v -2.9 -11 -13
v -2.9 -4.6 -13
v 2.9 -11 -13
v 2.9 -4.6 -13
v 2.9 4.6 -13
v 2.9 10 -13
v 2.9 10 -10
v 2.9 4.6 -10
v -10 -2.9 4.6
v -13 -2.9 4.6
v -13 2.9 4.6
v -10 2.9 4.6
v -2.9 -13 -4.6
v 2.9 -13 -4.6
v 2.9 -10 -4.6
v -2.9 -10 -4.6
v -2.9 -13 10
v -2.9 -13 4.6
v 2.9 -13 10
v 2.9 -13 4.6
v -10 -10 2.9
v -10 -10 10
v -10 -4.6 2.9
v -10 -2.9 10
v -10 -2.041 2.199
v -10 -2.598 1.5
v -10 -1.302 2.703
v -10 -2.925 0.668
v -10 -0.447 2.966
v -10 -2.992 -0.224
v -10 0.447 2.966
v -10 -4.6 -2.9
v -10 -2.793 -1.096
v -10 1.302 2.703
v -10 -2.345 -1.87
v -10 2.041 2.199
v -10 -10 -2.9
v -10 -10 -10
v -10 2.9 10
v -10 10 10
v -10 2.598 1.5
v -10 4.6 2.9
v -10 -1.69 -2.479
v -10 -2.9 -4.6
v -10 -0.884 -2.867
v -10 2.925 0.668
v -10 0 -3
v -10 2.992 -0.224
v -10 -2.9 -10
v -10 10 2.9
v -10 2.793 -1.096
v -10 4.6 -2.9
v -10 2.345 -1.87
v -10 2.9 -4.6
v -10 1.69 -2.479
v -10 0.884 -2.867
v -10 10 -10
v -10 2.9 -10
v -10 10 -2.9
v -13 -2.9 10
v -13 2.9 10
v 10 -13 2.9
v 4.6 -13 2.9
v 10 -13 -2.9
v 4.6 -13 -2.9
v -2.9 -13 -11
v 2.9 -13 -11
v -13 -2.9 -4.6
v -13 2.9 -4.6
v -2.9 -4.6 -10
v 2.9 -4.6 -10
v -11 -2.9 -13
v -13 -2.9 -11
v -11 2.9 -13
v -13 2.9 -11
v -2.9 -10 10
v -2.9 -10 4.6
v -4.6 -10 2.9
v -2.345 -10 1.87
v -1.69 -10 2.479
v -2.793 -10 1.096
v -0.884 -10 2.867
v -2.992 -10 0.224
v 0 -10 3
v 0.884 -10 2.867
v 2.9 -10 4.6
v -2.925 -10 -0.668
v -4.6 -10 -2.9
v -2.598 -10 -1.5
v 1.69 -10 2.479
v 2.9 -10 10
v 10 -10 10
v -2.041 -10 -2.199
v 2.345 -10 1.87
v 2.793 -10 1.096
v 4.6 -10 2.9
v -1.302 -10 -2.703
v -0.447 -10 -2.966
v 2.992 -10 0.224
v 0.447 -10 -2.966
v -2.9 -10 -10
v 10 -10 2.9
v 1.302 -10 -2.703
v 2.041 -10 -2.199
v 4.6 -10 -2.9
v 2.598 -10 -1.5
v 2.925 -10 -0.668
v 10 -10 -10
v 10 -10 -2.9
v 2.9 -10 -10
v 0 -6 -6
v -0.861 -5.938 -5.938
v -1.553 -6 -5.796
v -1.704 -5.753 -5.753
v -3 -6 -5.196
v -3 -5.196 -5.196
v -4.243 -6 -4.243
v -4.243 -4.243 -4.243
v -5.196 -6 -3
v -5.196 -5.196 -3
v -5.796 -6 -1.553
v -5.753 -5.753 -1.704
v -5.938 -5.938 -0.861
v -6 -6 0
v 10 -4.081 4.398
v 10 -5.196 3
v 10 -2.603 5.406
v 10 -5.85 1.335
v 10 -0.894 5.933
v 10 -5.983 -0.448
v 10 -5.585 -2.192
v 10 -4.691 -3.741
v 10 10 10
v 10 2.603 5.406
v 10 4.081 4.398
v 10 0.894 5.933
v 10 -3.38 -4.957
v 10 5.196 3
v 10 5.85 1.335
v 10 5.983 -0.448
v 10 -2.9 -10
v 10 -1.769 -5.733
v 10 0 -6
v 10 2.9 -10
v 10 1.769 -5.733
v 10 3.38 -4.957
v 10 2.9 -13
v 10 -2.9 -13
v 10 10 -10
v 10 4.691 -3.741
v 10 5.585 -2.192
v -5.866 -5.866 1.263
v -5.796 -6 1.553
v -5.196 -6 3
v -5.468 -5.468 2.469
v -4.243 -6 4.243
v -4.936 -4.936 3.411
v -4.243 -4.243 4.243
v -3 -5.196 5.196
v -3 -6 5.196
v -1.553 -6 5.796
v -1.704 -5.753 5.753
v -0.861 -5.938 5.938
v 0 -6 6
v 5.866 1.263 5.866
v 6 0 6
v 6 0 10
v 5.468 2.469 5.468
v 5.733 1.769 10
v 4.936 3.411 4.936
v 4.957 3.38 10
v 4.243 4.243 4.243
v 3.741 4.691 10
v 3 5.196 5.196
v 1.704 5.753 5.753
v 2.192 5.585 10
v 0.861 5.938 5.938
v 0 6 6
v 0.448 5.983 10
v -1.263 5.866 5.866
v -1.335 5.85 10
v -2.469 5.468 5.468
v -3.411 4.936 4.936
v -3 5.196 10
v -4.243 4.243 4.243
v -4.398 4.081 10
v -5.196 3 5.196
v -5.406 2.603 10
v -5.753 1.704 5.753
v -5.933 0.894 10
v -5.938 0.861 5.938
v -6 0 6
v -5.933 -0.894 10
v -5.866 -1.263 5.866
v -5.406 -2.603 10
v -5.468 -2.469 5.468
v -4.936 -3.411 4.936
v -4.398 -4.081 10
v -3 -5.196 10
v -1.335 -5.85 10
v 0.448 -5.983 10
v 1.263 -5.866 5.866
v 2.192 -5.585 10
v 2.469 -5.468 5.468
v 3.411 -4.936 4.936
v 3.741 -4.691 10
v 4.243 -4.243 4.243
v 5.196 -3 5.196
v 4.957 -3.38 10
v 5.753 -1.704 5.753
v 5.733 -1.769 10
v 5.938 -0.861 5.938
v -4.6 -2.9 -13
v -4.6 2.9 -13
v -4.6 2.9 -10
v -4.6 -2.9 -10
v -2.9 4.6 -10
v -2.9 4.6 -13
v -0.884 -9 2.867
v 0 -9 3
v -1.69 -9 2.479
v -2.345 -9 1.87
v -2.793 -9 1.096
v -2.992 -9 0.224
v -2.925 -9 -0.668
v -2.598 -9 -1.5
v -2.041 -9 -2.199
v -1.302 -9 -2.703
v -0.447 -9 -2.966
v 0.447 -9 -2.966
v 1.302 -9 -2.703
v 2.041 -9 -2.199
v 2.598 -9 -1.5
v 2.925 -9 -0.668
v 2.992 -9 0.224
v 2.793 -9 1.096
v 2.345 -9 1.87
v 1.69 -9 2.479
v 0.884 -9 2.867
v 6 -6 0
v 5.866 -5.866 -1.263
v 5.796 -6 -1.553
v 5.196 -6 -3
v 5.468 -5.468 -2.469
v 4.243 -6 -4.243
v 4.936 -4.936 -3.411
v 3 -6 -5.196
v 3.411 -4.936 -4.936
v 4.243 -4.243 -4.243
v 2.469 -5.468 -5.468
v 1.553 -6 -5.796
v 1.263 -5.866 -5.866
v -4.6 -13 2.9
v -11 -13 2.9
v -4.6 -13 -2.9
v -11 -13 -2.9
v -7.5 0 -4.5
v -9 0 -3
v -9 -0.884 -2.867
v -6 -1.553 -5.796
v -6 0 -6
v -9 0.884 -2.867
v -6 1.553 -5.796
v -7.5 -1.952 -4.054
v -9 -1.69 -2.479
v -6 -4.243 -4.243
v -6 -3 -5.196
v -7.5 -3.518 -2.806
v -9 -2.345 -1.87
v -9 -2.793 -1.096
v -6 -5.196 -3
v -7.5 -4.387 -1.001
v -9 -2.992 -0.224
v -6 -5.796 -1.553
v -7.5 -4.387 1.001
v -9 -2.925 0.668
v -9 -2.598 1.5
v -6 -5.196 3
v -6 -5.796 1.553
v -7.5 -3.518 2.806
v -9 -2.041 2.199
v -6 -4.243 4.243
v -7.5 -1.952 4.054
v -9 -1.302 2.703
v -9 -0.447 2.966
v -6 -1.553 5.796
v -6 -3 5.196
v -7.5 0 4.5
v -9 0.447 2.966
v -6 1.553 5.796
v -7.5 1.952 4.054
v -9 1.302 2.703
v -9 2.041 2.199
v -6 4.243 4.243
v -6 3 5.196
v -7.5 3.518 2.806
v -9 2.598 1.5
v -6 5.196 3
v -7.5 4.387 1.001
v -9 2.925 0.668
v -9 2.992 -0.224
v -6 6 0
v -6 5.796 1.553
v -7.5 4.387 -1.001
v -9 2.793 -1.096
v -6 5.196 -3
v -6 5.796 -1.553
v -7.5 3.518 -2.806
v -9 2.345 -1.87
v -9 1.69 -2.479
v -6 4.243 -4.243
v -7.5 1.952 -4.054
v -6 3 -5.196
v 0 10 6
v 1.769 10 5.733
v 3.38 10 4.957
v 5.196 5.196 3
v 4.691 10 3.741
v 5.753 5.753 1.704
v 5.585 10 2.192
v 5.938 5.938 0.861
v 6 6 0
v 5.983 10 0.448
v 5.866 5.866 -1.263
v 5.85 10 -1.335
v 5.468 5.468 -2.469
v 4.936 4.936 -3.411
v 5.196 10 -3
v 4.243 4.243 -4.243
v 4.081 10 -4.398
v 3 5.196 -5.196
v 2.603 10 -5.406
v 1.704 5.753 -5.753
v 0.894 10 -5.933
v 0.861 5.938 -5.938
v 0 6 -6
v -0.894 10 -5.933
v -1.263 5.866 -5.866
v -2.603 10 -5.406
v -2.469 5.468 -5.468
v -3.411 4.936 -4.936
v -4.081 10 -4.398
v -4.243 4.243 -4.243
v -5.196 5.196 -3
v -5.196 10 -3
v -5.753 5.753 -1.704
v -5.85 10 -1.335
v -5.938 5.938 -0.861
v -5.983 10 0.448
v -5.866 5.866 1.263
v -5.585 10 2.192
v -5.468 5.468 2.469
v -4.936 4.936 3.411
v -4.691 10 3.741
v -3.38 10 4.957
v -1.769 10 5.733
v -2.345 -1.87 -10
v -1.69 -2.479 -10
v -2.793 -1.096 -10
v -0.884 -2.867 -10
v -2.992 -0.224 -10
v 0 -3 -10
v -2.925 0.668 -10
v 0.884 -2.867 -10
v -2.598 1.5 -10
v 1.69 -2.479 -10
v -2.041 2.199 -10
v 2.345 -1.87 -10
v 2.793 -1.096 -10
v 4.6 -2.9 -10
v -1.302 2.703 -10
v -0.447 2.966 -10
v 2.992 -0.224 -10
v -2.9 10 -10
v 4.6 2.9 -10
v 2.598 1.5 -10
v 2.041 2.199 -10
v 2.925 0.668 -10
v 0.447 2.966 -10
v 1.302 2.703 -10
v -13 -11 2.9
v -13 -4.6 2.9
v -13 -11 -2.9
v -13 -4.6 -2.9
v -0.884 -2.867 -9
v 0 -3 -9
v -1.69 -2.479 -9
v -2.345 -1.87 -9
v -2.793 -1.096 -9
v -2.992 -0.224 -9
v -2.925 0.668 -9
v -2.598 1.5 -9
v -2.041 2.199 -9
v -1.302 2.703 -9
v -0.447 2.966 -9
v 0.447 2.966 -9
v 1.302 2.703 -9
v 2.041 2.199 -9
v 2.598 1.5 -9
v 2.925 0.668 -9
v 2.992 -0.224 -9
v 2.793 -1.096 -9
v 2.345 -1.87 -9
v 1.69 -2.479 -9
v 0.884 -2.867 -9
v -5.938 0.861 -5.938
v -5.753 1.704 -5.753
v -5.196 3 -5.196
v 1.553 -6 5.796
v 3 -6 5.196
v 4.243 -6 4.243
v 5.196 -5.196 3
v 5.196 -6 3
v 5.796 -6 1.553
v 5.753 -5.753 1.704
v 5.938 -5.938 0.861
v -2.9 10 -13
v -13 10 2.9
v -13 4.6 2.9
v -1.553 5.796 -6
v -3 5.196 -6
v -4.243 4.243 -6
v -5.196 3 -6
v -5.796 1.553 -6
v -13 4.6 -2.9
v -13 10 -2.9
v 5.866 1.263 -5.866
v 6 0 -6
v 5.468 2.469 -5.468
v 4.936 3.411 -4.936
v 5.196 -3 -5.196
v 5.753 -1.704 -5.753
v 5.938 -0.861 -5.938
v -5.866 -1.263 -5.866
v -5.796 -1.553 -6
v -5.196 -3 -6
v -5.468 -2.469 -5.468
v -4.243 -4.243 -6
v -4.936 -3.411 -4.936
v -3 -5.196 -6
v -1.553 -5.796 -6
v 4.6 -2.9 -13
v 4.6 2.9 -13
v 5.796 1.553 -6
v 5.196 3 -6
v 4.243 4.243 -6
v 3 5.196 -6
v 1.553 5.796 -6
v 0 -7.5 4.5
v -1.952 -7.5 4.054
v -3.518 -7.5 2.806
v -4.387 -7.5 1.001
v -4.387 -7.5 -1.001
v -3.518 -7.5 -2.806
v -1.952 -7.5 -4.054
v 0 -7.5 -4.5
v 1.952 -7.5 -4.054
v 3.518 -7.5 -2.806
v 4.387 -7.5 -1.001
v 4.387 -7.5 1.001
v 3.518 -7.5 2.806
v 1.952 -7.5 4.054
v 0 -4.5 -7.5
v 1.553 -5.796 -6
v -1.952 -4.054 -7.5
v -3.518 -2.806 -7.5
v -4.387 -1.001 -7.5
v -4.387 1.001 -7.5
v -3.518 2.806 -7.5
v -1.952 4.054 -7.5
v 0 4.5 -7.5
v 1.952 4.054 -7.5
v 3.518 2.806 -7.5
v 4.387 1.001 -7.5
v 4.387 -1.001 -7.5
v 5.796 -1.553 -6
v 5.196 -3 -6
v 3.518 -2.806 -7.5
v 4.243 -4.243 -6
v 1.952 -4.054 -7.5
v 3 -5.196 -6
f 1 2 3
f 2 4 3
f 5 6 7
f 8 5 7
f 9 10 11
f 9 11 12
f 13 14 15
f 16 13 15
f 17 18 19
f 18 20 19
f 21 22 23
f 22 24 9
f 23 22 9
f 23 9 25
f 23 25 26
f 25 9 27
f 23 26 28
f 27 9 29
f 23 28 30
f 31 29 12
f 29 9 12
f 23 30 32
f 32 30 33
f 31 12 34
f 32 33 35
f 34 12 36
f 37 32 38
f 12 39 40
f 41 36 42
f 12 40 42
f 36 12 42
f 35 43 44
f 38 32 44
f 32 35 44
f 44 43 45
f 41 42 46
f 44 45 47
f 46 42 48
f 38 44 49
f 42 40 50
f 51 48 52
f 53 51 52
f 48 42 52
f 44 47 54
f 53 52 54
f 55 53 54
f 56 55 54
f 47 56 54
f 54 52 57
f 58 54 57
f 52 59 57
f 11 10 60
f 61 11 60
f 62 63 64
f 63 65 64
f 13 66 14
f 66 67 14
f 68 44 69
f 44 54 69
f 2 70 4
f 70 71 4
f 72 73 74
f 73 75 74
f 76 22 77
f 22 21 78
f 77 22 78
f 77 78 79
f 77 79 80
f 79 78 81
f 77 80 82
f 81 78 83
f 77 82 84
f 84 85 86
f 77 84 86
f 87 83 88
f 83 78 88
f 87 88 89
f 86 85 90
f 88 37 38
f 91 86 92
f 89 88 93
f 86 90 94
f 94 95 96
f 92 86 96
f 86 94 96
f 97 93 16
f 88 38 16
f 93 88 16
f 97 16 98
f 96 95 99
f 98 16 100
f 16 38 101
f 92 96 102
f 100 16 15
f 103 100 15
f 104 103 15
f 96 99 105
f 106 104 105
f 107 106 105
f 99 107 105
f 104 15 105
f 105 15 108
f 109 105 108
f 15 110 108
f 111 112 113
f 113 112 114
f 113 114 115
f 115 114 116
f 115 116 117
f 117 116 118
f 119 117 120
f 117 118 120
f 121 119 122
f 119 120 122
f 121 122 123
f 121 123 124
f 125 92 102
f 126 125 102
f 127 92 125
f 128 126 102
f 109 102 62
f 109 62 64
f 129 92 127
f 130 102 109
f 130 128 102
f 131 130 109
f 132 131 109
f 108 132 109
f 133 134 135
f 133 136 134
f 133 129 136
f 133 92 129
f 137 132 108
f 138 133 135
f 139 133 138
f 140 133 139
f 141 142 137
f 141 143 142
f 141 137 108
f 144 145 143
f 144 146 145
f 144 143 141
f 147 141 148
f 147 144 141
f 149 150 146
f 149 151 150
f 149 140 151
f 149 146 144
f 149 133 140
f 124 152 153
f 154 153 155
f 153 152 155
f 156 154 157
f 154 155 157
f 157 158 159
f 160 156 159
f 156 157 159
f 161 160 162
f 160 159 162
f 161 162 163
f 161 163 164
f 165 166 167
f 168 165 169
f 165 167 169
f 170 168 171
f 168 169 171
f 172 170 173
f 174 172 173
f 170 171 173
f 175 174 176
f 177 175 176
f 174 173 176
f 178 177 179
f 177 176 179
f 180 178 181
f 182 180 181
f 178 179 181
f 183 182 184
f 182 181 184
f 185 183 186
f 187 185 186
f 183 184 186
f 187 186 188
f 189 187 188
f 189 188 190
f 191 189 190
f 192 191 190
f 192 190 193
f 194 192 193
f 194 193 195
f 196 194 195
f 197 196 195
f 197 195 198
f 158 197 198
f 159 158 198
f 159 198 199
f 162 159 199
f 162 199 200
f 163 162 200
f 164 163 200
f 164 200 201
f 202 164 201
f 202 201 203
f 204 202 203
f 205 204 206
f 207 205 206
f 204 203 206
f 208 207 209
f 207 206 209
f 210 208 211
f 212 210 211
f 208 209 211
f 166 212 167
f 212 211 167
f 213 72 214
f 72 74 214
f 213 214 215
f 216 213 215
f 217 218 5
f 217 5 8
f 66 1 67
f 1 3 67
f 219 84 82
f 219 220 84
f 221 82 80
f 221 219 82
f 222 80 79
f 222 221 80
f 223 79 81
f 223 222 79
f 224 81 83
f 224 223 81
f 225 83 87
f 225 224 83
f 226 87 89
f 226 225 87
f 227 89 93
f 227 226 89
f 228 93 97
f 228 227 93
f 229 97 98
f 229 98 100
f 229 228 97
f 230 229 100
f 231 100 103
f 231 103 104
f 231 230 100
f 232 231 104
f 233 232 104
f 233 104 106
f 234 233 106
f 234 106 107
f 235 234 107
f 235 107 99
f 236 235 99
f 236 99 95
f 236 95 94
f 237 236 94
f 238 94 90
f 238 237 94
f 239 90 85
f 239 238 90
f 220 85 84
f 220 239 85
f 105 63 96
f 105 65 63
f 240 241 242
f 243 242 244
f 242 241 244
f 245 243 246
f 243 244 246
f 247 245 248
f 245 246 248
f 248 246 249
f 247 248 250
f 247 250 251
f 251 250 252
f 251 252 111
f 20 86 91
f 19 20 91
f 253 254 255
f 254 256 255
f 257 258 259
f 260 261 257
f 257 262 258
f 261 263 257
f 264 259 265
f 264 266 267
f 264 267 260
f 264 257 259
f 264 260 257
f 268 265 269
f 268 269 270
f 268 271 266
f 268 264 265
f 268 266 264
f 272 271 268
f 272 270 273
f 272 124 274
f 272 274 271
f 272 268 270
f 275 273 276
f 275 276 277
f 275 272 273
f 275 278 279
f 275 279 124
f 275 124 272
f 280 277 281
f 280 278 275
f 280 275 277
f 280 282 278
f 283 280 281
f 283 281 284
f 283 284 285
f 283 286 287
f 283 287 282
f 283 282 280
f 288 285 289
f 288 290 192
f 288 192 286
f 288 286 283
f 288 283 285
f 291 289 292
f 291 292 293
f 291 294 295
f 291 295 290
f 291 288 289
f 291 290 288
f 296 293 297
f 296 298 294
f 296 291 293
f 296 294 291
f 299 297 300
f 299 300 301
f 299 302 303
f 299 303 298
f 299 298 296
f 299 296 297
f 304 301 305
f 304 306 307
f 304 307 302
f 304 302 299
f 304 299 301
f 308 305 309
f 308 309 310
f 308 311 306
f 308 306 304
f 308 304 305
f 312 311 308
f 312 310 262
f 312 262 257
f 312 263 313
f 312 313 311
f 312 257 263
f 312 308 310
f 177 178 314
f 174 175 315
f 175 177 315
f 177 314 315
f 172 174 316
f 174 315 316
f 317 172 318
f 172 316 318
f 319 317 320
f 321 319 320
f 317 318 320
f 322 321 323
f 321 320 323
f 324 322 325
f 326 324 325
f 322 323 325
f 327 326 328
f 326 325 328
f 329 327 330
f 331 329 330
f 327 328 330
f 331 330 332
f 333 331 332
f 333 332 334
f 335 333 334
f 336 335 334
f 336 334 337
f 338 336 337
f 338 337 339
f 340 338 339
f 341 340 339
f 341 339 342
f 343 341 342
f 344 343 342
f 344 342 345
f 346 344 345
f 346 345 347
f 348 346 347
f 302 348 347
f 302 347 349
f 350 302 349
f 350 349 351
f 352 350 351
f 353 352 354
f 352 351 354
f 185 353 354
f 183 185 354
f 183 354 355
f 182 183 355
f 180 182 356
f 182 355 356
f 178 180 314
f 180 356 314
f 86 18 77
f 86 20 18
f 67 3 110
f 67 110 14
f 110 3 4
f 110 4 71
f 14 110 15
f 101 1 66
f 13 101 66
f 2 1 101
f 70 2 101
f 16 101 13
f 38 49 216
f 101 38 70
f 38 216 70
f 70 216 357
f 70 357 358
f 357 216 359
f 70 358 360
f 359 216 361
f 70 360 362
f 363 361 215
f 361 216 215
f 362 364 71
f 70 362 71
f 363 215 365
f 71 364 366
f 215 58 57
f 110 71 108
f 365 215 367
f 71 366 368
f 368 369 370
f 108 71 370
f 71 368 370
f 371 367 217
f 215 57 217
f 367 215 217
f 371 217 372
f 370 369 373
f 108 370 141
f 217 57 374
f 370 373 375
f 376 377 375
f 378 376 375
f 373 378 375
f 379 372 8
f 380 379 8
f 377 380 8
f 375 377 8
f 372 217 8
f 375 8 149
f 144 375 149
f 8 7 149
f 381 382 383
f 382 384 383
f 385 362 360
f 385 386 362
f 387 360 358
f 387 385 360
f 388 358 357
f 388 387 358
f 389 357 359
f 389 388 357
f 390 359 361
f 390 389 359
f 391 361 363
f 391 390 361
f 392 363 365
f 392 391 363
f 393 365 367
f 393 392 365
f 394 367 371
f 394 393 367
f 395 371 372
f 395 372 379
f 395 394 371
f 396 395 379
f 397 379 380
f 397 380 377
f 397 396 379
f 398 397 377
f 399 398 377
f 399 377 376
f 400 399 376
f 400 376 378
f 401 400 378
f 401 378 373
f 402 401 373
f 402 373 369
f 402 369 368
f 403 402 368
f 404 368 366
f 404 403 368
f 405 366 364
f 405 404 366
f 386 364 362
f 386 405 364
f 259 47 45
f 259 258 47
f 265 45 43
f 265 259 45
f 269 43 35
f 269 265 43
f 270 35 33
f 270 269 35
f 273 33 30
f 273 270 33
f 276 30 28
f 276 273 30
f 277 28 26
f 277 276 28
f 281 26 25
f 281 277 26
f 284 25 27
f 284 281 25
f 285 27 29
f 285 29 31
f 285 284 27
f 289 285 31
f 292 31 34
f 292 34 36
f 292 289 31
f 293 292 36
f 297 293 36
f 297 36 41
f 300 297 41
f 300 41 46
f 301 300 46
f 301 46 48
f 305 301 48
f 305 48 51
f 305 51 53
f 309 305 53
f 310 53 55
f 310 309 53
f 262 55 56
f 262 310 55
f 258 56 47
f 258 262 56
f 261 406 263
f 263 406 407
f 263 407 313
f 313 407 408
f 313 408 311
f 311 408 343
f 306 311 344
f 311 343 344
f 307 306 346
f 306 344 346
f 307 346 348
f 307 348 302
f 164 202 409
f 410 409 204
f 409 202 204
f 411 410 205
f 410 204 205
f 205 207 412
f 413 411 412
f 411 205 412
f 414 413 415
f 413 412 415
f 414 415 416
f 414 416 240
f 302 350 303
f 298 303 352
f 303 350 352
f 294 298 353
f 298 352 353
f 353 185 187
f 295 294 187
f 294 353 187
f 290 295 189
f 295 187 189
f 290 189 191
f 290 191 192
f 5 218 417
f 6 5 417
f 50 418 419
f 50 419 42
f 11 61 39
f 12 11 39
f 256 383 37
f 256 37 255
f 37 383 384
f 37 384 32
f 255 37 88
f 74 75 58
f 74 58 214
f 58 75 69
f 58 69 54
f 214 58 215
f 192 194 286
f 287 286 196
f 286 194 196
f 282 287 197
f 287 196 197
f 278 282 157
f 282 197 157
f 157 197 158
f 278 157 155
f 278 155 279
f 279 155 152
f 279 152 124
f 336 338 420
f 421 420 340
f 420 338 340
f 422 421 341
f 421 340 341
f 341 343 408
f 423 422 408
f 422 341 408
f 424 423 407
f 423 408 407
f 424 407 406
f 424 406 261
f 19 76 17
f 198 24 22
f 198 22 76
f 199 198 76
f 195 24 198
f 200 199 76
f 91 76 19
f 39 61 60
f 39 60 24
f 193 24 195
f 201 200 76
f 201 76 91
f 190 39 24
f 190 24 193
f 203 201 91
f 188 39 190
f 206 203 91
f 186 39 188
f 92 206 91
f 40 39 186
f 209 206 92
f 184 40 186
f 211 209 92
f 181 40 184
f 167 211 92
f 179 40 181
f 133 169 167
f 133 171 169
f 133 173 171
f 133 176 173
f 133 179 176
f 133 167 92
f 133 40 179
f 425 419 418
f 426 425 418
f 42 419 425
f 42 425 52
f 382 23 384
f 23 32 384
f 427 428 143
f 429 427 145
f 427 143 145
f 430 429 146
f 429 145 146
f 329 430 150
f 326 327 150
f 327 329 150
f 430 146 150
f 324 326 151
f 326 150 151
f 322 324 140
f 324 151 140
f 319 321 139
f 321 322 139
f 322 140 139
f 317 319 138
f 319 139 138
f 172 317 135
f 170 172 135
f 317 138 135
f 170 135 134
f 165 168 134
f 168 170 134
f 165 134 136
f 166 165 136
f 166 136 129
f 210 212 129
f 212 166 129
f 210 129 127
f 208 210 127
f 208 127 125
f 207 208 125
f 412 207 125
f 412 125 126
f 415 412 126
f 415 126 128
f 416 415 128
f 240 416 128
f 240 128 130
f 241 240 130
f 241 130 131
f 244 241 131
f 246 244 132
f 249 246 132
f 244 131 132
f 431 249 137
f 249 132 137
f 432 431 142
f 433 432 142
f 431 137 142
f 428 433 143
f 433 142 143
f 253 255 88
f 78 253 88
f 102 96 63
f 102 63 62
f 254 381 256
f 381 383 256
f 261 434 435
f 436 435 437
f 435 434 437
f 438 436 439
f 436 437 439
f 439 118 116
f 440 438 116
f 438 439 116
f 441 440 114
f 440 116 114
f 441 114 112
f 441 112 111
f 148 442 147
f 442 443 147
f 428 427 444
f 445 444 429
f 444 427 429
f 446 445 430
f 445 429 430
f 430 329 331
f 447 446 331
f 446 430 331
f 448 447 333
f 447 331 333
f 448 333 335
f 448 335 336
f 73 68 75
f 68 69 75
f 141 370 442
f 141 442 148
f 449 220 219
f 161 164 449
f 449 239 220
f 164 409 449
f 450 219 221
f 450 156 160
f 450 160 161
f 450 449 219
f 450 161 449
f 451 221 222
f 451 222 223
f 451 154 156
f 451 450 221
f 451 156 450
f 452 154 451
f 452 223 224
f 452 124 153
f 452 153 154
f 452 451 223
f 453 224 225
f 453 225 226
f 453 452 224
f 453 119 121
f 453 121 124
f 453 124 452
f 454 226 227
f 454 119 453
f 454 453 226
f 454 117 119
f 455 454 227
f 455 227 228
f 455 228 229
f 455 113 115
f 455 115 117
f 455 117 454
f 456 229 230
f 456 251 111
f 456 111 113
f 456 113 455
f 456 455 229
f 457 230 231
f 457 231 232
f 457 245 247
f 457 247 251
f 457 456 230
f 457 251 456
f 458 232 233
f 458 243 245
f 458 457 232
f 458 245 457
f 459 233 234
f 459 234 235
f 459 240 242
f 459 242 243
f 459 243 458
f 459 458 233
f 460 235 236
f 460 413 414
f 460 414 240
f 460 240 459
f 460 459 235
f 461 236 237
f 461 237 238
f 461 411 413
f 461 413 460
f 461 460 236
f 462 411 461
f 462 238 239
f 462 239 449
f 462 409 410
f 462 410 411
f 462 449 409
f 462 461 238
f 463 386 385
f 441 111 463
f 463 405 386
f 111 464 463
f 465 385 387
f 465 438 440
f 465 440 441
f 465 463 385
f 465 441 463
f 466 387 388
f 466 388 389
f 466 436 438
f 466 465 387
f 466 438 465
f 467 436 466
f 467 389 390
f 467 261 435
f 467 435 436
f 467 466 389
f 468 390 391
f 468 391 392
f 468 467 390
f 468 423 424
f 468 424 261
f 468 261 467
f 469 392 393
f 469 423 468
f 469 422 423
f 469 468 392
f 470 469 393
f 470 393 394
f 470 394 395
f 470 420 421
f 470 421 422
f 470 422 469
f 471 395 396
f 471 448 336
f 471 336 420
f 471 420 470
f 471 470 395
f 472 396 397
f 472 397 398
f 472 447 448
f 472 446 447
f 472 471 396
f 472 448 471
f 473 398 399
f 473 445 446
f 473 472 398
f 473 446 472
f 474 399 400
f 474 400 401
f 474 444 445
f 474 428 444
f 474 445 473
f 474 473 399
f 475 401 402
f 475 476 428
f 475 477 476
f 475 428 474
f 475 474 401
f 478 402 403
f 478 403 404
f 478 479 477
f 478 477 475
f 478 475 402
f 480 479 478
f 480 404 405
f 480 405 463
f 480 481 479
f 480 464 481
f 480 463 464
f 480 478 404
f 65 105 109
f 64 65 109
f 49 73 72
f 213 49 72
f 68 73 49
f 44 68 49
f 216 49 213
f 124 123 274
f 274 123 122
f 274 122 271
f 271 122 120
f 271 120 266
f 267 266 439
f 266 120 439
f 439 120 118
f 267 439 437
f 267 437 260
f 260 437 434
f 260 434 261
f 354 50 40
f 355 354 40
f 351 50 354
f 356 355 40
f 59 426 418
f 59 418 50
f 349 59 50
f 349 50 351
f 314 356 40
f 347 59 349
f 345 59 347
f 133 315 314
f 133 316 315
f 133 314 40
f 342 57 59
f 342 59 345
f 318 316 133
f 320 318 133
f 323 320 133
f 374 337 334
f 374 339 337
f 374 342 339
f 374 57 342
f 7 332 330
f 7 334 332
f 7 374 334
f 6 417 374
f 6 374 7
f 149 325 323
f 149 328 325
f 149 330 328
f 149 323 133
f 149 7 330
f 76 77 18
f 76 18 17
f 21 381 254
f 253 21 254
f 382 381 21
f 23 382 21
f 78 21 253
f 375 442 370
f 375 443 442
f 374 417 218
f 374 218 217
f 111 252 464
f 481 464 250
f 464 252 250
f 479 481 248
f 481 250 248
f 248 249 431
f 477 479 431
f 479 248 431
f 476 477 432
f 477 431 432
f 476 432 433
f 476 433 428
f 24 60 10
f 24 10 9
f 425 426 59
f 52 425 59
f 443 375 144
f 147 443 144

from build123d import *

# Parameters (mm, degrees)
SKETCH1_W           = 20
SKETCH1_H           = 20
BOSS_EXTRUDE1_DEPTH = 10
SKETCH_Z_R          = 6
CUT_EXTRUDE1_DEPTH  = 16
SKETCH_Y_R          = 6
CUT_EXTRUDE2_DEPTH  = 16
SKETCH_X_R          = 6
CUT_EXTRUDE3_DEPTH  = 16
SKETCH32_W          = 5.4
SKETCH32_H          = 3
SKETCH32_W_2        = 3
SKETCH32_H_2        = 5.4
CON_DEPTH           = 2.9
CIRPATTERN5_COUNT   = 2
CIRPATTERN5_ANGLE   = 270
CIRPATTERN9_COUNT   = 2
CIRPATTERN9_ANGLE   = 90


with BuildPart() as part:
    # Sketch1 → Boss-Extrude1 (new, symmetric)
    with BuildSketch(Plane(origin=(0, 0, 0), x_dir=(1, 0, 0), z_dir=(0, 1, 0))):
        Rectangle(SKETCH1_W, SKETCH1_H)
    extrude(amount=BOSS_EXTRUDE1_DEPTH, both=True)

    # Sketch Z → Cut-Extrude1 (cut)
    with BuildSketch(Plane.XY.offset(10)):
        Circle(SKETCH_Z_R)
    extrude(amount=-CUT_EXTRUDE1_DEPTH, mode=Mode.SUBTRACT)

    # Sketch Y → Cut-Extrude2 (cut)
    with BuildSketch(Plane(origin=(0, 10, 0), x_dir=(1, 0, 0), z_dir=(0, 1, 0))):
        with Locations(Location((0, 0, 0), (0, 0, 270))):
            Circle(SKETCH_Y_R)
    extrude(amount=-CUT_EXTRUDE2_DEPTH, mode=Mode.SUBTRACT)

    # Sketch X → Cut-Extrude3 (cut)
    with BuildSketch(Plane(origin=(10, 0, 0), x_dir=(0, 0, -1), z_dir=(1, 0, 0))):
        Circle(SKETCH_X_R)
    extrude(amount=-CUT_EXTRUDE3_DEPTH, mode=Mode.SUBTRACT)

    # Sketch23 → CSK for M6 Flat Head Machine Screw23 (revolve, cut)
    with BuildSketch(Plane(origin=(-6, 0, 0), x_dir=(0, 0, -1), z_dir=(0, 1, 0))):
        Polygon((0, 0), (0, 4), (3, 4), (3, 3), (6, 0), align=None)
    revolve(axis=Axis((0.35, 0, 0), (-1, 0, 0)), mode=Mode.SUBTRACT)

    # Sketch24 → CSK for M6 Flat Head Machine Screw24 (revolve, cut)
    with BuildSketch(Plane(origin=(0, 0, -6), x_dir=(0, -1, 0), z_dir=(1, 0, 0))):
        Polygon((0, 0), (0, 4), (3, 4), (3, 3), (6, 0), align=None)
    revolve(axis=Axis((0, 0, 0.35), (0, 0, -1)), mode=Mode.SUBTRACT)

    # Sketch26 → CSK for M6 Flat Head Machine Screw25 (revolve, cut)
    with BuildSketch(Plane(origin=(0, -6, 0), x_dir=(0, 0, 1), z_dir=(1, 0, 0))):
        Polygon((0, 0), (0, 4), (3, 4), (3, 3), (6, 0), align=None)
    revolve(axis=Axis((0, 0.35, 0), (0, -1, 0)), mode=Mode.SUBTRACT)

    # Sketch32 → con (add, symmetric)
    with BuildSketch(Plane.XY):
        Polygon((-10, -10), (-10, -4.6), (-13, -4.6), (-13, -11), (-11, -13), (-4.6, -13), (-4.6, -10), align=None)
        with Locations((7.3, -11.5)):
            Rectangle(SKETCH32_W, SKETCH32_H)
        with Locations((-11.5, 7.3)):
            Rectangle(SKETCH32_W_2, SKETCH32_H_2)
    con = extrude(amount=CON_DEPTH, both=True)

    # CirPattern5: con ×2 about axis
    cirpattern5_axis = Axis((0, 0, 0), (0, 1, 0))
    for i in range(1, CIRPATTERN5_COUNT):
        add(con.rotate(cirpattern5_axis, i * CIRPATTERN5_ANGLE / (CIRPATTERN5_COUNT - 1)))

    # CirPattern9: con ×2 about axis
    cirpattern9_axis = Axis((0, 0, 0), (1, 0, 0))
    for i in range(1, CIRPATTERN9_COUNT):
        add(con.rotate(cirpattern9_axis, i * CIRPATTERN9_ANGLE / (CIRPATTERN9_COUNT - 1)))


solid = part.part
